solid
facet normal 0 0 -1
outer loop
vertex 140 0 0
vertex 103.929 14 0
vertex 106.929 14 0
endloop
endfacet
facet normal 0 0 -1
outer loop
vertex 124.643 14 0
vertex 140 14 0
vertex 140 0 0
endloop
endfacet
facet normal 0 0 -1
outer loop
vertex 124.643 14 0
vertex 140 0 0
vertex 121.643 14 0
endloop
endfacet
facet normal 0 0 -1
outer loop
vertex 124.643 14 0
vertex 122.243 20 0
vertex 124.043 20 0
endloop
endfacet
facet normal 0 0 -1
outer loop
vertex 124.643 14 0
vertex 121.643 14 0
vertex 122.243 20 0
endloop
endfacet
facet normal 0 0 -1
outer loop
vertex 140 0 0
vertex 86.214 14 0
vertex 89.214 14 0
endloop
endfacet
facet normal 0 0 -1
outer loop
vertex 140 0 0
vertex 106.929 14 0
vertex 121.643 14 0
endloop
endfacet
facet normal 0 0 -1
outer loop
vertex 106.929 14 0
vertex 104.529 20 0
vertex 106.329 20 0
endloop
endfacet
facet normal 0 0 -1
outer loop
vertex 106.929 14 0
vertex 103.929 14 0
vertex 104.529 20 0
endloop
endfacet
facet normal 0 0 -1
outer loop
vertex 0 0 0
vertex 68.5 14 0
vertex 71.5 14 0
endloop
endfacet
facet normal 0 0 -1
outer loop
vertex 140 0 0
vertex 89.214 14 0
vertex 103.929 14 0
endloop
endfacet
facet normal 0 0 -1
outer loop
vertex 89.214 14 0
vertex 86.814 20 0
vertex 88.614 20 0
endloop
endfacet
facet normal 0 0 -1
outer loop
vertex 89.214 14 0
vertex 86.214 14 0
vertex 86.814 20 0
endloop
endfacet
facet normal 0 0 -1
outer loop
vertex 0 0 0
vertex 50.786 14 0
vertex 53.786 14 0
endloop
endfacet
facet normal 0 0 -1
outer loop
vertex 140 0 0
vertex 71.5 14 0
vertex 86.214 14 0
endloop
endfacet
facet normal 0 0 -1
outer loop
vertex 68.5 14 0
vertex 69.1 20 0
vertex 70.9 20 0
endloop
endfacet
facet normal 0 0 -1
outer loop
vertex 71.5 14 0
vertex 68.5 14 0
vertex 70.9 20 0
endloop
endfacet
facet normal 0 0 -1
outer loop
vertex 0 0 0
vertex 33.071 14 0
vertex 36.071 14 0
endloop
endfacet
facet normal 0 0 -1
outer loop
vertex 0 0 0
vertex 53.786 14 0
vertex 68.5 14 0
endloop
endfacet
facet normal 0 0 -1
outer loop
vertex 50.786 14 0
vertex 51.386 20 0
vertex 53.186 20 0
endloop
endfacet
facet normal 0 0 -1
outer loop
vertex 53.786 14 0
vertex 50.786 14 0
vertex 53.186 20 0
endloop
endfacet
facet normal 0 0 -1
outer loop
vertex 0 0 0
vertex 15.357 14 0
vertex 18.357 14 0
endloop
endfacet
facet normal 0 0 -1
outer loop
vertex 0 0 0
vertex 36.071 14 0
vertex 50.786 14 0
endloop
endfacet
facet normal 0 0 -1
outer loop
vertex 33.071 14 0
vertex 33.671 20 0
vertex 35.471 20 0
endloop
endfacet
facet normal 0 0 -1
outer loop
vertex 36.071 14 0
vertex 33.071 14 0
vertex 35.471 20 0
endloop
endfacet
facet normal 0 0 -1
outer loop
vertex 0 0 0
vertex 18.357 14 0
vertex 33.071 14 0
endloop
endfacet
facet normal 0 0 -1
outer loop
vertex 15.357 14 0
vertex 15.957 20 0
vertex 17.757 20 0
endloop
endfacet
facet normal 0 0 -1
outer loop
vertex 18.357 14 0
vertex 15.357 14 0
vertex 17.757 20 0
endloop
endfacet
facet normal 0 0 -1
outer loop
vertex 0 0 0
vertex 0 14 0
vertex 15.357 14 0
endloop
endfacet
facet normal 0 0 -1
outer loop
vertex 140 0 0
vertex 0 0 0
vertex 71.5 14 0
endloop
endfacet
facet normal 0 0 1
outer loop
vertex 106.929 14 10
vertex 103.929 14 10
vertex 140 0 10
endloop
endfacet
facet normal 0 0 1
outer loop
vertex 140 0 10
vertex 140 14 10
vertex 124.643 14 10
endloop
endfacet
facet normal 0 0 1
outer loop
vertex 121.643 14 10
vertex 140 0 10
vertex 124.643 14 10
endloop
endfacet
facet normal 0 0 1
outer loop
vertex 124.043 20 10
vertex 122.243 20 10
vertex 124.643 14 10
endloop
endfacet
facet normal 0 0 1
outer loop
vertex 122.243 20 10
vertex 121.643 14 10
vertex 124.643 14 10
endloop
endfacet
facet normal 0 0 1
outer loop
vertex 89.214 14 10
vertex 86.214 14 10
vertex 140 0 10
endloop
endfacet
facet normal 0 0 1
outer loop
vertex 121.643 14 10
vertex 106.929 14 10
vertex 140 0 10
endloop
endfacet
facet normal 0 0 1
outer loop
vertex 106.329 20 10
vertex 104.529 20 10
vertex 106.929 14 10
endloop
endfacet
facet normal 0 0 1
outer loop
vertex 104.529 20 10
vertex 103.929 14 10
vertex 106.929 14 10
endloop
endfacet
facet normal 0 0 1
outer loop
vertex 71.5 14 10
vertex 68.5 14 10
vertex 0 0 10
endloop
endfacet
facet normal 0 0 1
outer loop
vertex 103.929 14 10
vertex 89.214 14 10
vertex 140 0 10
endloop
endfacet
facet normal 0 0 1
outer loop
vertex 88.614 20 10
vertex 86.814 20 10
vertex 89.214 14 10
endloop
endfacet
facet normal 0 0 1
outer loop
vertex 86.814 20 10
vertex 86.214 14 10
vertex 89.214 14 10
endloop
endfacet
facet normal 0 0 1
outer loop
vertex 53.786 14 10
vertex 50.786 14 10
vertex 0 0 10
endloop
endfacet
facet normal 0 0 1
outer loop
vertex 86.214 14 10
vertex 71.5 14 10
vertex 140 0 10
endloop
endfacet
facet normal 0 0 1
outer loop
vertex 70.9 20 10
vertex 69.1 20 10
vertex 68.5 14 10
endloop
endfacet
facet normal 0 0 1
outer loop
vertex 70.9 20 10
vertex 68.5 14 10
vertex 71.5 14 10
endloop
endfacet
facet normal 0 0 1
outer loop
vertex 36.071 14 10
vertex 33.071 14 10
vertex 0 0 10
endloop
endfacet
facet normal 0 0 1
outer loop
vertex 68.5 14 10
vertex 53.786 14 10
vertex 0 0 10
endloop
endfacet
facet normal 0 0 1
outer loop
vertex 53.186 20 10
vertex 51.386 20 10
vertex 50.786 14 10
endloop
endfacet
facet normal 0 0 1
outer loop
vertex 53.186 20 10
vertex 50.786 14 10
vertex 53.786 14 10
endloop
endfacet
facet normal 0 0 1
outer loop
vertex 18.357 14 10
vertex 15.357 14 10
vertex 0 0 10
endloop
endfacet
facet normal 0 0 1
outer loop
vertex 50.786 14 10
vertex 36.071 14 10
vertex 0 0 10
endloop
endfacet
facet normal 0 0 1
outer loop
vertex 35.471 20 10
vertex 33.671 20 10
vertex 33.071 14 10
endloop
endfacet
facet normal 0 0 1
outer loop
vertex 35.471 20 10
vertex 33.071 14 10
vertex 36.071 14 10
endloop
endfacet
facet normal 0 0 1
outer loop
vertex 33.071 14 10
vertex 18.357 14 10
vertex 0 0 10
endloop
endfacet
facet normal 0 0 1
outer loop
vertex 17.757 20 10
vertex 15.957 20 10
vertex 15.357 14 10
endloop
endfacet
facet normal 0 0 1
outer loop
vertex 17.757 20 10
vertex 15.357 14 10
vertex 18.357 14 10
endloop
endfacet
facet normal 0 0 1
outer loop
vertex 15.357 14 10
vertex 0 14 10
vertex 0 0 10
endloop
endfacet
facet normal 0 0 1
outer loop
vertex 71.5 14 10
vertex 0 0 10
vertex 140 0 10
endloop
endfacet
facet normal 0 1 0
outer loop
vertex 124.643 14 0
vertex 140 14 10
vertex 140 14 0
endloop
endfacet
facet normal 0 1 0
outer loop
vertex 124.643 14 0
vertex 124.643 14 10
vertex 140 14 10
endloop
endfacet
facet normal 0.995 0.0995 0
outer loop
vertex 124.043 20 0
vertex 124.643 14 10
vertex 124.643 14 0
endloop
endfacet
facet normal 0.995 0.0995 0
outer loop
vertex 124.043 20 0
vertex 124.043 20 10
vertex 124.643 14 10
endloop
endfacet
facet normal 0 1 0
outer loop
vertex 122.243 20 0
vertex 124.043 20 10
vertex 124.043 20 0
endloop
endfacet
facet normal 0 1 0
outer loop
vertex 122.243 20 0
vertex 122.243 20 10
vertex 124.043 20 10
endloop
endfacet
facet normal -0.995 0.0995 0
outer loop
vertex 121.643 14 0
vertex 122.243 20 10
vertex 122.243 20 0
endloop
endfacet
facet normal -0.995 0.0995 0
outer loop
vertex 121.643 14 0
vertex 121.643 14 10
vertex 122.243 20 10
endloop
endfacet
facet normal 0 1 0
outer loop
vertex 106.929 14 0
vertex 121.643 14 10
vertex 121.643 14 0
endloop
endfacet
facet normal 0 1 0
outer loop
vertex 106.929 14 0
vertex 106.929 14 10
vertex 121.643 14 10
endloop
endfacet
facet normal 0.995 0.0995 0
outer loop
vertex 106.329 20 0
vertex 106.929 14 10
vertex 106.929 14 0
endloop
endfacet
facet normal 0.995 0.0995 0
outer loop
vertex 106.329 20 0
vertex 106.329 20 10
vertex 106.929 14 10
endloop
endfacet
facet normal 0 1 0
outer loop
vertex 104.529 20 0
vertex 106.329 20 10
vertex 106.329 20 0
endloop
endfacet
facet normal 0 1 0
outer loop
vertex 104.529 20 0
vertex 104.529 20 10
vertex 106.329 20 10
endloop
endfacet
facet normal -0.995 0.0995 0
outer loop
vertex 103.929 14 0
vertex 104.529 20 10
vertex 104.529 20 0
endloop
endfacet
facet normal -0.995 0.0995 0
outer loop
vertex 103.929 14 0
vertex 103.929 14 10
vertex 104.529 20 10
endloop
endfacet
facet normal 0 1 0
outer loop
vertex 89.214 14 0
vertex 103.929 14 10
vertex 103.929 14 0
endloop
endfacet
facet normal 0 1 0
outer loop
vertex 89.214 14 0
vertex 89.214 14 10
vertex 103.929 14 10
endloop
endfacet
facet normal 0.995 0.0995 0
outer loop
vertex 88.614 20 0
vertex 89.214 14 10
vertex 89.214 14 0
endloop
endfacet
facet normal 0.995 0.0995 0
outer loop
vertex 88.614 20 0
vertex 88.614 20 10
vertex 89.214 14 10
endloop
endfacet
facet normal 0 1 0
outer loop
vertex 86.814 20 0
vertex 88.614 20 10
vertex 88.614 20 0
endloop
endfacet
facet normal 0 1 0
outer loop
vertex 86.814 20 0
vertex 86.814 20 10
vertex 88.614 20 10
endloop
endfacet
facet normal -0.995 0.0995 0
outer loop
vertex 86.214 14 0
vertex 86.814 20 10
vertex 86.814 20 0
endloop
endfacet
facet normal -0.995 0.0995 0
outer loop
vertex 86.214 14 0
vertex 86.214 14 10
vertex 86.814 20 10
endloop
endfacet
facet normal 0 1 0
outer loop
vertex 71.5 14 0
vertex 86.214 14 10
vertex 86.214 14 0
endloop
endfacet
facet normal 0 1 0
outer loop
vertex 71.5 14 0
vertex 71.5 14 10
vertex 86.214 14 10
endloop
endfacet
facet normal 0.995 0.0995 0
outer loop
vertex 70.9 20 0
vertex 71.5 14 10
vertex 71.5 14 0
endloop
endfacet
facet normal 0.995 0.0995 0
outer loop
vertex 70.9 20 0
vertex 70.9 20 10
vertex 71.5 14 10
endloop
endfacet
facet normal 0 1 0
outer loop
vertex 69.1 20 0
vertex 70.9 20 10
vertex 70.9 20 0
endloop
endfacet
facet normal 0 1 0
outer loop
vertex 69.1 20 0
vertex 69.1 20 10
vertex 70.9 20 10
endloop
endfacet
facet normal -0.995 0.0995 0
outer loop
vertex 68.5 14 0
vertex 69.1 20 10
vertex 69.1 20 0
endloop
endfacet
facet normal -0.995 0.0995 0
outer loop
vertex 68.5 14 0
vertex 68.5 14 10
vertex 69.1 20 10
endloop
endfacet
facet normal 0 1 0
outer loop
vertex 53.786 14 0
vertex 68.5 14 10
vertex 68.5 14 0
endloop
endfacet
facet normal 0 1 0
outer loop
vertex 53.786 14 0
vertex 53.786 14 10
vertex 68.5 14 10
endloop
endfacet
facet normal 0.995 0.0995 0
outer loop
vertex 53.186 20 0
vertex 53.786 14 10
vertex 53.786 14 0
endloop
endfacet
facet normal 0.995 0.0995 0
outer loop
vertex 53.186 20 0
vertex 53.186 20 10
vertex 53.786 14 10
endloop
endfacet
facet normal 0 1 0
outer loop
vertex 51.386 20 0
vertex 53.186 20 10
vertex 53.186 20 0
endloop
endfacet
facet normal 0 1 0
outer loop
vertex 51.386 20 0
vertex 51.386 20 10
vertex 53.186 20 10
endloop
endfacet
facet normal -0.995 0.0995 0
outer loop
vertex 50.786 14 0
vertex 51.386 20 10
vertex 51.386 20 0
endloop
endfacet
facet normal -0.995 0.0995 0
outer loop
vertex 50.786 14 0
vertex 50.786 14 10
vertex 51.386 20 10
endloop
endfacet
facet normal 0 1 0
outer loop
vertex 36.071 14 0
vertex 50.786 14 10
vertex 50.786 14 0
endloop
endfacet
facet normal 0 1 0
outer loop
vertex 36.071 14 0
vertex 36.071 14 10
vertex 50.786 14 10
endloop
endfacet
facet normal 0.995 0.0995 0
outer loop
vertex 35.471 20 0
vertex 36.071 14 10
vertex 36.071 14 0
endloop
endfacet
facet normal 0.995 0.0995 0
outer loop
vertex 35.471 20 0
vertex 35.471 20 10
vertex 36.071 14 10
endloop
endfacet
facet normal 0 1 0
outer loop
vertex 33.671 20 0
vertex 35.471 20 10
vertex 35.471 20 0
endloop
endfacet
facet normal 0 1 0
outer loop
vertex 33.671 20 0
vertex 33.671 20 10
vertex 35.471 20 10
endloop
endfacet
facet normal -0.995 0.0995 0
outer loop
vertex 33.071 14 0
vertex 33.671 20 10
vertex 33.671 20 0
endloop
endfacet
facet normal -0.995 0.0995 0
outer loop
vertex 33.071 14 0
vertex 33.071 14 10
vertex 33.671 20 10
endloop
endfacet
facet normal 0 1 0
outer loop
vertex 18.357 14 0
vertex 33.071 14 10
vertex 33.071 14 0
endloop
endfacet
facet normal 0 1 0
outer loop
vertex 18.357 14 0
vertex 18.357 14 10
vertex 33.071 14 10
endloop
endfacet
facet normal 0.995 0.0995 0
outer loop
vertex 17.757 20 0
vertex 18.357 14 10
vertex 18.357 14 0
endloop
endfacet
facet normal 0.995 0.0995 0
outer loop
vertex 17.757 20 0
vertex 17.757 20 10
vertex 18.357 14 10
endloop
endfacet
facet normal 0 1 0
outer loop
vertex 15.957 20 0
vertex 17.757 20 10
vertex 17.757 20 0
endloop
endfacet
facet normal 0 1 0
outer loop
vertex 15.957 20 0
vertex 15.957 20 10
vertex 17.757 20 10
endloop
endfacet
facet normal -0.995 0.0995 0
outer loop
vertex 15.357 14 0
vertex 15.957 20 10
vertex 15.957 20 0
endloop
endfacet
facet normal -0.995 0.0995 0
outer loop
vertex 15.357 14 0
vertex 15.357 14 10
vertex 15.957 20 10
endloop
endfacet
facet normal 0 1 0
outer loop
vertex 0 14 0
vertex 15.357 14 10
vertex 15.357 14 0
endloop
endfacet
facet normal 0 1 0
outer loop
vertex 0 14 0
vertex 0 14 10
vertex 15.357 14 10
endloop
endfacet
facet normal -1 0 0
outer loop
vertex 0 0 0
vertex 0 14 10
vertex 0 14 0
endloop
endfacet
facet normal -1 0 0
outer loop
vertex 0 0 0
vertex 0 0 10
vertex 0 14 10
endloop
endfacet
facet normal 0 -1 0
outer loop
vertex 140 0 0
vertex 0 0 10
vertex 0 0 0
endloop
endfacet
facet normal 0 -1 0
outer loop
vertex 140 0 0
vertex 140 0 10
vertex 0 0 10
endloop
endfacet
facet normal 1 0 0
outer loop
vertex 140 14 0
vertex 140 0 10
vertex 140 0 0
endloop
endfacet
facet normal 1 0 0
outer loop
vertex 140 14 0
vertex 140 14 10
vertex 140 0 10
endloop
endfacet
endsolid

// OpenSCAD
$fn = 32;

// ----------------------------------------------------------------------
// Gear rack: 7 teeth on a 140 mm bar, pitch 17.71 mm
// ----------------------------------------------------------------------

// --- parameters (mm) ---
profile_height = 10;      // extrusion height
profile_points = 32;      // points of the closed outline

profile = [[0, 0], [140, 0], [140, 14], [124.643, 14], [124.043, 20], [122.243, 20], [121.643, 14], [106.929, 14], [106.329, 20], [104.529, 20], [103.929, 14], [89.214, 14], [88.614, 20], [86.814, 20], [86.214, 14], [71.5, 14], [70.9, 20], [69.1, 20], [68.5, 14], [53.786, 14], [53.186, 20], [51.386, 20], [50.786, 14], [36.071, 14], [35.471, 20], [33.671, 20], [33.071, 14], [18.357, 14], [17.757, 20], [15.957, 20], [15.357, 14], [0, 14]];  // single closed polygon, 32 points, counter clockwise

// --- the one profile operation ---
linear_extrude(height = profile_height) polygon(points = profile);
